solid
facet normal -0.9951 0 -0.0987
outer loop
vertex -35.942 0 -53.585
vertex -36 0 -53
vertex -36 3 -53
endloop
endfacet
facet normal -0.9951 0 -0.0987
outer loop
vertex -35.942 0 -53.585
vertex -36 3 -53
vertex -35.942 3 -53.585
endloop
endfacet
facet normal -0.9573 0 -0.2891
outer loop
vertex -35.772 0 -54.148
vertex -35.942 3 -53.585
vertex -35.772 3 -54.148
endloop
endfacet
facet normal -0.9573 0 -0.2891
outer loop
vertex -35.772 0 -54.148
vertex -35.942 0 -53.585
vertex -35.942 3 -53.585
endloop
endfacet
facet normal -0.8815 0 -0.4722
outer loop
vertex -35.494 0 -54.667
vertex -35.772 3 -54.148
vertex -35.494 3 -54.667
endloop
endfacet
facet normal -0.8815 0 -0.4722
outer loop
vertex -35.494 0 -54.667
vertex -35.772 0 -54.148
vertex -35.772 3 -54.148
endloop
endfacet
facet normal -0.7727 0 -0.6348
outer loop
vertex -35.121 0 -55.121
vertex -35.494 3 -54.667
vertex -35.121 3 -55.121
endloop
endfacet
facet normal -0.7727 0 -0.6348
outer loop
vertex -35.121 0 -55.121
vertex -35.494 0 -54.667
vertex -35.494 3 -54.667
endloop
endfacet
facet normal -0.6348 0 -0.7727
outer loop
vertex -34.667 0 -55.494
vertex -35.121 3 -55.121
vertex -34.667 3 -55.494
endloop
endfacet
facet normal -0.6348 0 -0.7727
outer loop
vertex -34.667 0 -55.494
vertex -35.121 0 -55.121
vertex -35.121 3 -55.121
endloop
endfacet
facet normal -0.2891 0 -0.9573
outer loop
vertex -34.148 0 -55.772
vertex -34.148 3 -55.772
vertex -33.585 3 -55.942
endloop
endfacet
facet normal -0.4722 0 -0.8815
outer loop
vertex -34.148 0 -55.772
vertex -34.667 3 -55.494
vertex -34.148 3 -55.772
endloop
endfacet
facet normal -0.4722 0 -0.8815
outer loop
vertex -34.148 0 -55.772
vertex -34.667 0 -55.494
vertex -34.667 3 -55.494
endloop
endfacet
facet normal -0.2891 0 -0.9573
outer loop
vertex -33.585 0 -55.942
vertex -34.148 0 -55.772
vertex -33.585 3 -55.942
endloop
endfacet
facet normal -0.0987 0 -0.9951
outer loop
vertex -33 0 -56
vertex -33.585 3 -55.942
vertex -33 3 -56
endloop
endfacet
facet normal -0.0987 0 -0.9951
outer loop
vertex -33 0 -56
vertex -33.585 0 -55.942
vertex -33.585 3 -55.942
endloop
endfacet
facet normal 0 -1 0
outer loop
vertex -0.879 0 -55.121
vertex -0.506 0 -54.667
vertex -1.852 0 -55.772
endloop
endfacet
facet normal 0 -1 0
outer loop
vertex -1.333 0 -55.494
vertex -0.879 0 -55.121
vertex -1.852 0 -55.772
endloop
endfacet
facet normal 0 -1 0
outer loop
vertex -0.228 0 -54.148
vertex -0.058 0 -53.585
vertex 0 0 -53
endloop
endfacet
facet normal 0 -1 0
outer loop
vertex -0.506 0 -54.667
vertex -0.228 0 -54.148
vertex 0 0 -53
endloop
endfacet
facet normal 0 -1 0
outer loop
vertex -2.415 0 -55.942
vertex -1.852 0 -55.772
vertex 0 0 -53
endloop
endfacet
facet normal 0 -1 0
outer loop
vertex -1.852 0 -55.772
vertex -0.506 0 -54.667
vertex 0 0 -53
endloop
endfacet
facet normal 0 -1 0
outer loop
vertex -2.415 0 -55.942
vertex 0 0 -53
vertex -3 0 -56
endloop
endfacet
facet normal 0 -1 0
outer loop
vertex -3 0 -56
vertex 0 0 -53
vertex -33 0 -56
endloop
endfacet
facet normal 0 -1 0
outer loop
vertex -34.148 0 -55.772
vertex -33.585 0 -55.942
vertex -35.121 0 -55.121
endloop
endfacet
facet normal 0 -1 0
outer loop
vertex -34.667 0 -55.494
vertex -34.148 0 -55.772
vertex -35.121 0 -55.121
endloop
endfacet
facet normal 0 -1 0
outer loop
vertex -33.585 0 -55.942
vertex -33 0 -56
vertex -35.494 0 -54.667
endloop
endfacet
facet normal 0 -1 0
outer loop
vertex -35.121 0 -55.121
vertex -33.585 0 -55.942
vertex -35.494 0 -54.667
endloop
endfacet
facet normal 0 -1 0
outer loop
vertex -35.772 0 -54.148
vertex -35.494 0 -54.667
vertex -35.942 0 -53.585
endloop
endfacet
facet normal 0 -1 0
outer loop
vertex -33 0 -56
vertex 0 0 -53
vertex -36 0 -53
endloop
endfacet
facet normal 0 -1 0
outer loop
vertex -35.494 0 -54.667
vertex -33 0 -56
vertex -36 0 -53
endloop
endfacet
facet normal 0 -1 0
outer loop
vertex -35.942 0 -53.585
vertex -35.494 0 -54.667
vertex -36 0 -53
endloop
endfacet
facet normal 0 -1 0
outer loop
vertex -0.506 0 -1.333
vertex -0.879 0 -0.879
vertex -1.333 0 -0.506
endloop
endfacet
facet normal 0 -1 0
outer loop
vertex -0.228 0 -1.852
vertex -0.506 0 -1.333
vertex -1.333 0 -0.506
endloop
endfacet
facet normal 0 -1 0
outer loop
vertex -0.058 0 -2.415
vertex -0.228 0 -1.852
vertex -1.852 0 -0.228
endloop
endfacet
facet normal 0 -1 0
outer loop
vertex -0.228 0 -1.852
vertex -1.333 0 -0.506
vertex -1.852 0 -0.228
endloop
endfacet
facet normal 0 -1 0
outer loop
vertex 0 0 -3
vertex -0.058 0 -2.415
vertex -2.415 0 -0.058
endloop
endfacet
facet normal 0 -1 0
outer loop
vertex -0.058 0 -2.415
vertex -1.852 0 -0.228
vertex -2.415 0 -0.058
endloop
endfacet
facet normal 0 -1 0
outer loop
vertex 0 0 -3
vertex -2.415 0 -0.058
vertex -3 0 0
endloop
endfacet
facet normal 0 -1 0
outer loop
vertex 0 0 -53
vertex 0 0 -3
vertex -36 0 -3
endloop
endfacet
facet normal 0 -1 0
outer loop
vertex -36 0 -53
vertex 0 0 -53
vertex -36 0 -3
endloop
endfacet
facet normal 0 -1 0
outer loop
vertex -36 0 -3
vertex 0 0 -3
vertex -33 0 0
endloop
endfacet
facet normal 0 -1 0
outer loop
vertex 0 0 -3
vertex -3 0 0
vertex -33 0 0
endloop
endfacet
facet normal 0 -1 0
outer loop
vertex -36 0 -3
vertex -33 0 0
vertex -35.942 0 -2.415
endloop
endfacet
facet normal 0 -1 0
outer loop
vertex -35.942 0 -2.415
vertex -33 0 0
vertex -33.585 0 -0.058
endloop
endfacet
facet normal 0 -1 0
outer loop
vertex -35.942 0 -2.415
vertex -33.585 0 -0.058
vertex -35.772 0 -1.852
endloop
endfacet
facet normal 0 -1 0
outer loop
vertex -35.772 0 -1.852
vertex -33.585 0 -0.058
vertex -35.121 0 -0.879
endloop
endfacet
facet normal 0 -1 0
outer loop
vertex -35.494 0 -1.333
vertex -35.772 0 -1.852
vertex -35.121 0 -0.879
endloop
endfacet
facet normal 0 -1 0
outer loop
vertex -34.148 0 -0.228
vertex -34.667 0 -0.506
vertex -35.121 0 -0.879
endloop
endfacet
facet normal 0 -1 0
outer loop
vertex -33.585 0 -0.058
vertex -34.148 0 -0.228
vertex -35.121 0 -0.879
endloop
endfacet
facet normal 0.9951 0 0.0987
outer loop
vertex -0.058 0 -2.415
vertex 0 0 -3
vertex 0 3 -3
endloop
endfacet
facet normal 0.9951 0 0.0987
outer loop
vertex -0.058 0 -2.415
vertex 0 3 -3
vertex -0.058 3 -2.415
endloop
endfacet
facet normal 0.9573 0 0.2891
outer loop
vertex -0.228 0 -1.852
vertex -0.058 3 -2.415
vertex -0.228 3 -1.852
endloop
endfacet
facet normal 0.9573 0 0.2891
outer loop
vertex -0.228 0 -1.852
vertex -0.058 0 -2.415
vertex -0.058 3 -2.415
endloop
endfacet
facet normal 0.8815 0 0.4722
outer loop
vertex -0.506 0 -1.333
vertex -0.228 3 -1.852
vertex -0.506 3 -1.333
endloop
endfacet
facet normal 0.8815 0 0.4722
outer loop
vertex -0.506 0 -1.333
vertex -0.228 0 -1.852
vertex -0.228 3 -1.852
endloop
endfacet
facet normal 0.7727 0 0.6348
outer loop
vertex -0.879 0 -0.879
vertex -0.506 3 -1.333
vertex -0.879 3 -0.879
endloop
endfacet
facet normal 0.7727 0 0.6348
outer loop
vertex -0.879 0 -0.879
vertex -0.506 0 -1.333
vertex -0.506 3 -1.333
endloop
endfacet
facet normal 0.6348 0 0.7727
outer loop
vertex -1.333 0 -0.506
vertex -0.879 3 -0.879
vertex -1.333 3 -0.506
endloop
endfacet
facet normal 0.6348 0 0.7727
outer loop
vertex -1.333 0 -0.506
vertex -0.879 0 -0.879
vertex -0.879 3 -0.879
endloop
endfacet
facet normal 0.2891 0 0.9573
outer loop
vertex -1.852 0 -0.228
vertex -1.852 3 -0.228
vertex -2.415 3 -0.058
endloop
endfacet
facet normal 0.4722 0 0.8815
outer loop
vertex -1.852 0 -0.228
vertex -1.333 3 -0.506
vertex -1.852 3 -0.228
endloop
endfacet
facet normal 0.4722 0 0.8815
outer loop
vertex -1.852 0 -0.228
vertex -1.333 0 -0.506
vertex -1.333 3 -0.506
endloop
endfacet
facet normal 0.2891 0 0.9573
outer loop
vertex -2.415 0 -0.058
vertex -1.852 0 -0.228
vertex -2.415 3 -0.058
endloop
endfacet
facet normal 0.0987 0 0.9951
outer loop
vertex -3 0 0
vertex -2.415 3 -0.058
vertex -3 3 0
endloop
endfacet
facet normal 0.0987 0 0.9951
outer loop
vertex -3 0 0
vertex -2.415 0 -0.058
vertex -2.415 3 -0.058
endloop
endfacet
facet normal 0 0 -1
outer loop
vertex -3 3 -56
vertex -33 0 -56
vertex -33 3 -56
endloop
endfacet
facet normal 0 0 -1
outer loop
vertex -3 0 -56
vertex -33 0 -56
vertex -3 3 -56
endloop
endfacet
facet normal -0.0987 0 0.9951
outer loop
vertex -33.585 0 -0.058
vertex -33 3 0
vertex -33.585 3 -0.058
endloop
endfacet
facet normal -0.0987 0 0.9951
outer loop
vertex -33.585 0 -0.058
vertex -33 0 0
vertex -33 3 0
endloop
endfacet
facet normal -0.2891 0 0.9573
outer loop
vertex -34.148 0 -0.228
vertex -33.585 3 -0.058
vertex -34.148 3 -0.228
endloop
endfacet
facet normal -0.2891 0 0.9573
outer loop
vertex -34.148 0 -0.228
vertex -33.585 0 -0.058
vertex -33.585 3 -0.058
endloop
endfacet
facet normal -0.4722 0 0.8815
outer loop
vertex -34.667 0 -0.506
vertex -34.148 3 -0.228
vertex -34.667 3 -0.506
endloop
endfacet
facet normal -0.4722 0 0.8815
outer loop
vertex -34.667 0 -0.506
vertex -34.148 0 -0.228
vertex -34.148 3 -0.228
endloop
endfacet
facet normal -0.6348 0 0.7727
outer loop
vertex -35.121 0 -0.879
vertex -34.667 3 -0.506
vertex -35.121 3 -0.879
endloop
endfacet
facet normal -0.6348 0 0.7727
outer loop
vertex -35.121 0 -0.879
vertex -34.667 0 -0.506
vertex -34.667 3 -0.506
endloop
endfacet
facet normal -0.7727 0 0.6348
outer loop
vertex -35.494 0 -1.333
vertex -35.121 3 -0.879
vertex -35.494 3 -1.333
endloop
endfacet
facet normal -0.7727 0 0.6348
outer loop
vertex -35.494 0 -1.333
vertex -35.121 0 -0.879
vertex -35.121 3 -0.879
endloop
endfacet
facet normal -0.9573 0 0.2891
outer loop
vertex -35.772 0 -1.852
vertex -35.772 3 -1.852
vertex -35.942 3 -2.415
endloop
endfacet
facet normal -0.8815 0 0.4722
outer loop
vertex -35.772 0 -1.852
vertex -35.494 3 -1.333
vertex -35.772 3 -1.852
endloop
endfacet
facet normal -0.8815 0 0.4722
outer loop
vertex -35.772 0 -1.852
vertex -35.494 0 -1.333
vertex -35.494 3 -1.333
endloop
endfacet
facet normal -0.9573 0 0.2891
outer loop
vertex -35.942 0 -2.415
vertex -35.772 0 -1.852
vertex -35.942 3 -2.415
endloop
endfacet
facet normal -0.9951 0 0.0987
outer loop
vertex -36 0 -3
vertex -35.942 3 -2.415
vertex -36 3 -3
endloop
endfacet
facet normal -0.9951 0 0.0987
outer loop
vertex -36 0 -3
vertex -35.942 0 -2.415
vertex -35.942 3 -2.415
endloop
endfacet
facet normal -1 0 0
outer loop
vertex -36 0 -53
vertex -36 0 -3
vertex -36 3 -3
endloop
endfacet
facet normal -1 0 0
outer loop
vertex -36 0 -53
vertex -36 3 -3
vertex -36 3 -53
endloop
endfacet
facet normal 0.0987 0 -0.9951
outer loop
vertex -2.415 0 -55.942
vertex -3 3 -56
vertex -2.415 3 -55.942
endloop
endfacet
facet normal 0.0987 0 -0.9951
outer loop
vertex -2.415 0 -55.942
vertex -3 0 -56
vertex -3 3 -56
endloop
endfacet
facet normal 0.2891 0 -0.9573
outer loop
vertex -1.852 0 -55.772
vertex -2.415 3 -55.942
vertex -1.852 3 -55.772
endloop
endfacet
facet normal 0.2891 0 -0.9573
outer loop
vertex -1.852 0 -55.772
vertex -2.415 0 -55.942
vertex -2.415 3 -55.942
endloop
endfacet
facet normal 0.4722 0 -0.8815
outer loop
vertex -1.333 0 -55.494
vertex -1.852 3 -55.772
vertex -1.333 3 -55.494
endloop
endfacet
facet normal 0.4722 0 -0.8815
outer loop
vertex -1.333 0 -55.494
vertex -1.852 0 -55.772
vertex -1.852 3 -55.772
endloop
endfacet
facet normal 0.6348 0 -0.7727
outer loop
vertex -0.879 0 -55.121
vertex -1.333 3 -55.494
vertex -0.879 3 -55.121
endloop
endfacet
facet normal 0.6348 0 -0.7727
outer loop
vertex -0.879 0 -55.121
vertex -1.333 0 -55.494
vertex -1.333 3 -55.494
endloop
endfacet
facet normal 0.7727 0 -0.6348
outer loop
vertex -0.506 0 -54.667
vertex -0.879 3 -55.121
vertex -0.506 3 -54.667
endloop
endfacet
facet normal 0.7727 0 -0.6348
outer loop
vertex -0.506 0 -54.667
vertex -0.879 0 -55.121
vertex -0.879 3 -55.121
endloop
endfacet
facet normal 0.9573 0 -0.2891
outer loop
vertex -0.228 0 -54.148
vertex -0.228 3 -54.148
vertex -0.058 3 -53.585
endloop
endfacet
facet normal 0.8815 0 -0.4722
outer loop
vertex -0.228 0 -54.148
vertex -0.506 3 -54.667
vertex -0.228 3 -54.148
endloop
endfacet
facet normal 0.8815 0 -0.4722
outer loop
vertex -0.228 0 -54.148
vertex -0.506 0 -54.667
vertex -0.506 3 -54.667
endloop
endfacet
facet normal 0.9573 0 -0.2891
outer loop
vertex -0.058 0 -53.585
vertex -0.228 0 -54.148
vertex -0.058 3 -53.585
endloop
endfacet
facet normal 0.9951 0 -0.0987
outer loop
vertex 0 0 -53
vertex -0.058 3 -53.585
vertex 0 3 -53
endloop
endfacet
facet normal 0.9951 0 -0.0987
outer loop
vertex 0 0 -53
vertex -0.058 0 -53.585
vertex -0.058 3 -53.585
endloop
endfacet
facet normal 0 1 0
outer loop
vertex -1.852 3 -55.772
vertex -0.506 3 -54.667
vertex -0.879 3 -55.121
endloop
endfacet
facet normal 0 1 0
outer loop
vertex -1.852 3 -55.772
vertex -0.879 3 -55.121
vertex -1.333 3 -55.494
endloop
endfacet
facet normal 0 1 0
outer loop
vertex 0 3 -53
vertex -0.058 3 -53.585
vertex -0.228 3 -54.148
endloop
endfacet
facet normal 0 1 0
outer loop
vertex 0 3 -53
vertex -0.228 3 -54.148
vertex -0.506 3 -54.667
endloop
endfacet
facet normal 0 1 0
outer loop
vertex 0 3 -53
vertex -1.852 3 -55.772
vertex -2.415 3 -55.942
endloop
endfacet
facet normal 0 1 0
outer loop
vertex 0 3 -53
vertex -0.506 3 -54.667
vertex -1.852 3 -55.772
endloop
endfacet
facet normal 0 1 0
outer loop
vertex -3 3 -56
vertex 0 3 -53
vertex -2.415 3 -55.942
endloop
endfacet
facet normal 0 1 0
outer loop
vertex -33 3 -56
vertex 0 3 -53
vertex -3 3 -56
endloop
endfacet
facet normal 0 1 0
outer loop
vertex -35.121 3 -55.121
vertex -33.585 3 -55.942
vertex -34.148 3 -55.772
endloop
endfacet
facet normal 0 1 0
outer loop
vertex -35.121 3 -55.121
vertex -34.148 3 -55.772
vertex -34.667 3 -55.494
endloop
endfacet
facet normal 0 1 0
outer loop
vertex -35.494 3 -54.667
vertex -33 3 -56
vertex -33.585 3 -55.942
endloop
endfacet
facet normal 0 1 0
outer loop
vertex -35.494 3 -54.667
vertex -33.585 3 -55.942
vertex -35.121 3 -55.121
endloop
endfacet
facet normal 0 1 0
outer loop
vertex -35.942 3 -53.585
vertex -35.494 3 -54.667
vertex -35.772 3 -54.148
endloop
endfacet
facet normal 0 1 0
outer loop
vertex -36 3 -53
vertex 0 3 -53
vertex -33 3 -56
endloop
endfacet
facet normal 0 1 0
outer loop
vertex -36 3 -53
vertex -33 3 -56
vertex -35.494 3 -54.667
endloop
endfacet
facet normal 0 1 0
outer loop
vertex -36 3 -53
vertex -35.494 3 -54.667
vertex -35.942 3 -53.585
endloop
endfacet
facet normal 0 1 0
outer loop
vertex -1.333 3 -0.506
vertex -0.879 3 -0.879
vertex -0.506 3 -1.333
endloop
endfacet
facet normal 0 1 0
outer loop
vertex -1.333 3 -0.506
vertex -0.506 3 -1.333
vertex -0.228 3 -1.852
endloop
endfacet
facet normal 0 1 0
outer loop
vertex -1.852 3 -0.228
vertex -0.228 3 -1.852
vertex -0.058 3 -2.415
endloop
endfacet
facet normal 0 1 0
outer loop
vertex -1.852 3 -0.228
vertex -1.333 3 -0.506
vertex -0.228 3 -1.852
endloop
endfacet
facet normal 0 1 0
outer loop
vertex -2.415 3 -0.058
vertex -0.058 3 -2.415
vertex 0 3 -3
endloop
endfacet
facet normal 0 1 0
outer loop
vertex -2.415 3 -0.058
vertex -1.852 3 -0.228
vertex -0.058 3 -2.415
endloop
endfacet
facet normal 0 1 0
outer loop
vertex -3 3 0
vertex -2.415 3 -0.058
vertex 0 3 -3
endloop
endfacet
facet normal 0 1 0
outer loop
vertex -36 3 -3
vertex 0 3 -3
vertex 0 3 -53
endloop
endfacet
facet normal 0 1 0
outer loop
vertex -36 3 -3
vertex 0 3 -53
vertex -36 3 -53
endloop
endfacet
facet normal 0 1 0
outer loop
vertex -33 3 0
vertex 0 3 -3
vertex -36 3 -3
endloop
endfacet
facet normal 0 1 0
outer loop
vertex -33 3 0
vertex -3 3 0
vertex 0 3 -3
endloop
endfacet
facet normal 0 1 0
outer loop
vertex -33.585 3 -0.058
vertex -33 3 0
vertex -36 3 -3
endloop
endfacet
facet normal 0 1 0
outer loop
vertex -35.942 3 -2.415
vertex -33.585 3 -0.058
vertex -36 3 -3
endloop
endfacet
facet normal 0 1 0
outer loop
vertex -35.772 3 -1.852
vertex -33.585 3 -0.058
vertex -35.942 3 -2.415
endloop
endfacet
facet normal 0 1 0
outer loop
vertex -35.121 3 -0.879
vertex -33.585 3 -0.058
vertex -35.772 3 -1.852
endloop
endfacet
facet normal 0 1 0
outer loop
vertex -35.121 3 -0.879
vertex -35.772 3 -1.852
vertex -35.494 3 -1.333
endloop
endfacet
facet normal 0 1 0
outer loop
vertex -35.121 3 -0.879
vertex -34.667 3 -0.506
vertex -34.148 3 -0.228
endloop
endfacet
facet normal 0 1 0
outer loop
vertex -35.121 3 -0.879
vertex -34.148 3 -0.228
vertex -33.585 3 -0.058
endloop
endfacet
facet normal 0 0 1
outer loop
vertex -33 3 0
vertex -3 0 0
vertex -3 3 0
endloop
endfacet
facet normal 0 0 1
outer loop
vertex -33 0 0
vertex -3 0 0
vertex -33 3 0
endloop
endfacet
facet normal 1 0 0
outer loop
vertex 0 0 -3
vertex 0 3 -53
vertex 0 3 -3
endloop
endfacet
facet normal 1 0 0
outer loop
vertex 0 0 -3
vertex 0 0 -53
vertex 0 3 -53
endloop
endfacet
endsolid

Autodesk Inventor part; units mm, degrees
ref_plane "YZ Plane" through (0, 0, 0) normal (1, 0, 0) x (0, 1, 0)
ref_plane "XZ Plane" through (0, 0, 0) normal (0, 1, 0) x (-1, 0, 0)
ref_plane "XY Plane" through (0, 0, 0) normal (0, 0, 1) x (1, 0, 0)
sketch "Sketch1" plane through (0, 0, 0) normal (0, 1, 0) x (-1, 0, 0)
  line L0 (3, 0) -> (33, 0)
  line L1 (36, -3) -> (36, -53)
  line L2 (33, -56) -> (3, -56)
  line L3 (0, -53) -> (0, -3)
  arc A0 (33, -56) -> (36, -53) centre (33, -53) ccw
  arc A1 (0, -53) -> (3, -56) centre (3, -53) ccw
  arc A2 (3, 0) -> (0, -3) centre (3, -3) ccw
  arc A3 (36, -3) -> (33, 0) centre (33, -3) ccw
  point P0 (0, 0)
  point P1 (36, -56)
  point P2 (36, 0)
  point P3 (0, -56)
  dimension "d0" = 36
  dimension "d1" = 56
  dimension "d2" = 3
extrude "Extrusion1" add sketch "Sketch1" along normal blind 3
properties part number "tapa caja servos"
